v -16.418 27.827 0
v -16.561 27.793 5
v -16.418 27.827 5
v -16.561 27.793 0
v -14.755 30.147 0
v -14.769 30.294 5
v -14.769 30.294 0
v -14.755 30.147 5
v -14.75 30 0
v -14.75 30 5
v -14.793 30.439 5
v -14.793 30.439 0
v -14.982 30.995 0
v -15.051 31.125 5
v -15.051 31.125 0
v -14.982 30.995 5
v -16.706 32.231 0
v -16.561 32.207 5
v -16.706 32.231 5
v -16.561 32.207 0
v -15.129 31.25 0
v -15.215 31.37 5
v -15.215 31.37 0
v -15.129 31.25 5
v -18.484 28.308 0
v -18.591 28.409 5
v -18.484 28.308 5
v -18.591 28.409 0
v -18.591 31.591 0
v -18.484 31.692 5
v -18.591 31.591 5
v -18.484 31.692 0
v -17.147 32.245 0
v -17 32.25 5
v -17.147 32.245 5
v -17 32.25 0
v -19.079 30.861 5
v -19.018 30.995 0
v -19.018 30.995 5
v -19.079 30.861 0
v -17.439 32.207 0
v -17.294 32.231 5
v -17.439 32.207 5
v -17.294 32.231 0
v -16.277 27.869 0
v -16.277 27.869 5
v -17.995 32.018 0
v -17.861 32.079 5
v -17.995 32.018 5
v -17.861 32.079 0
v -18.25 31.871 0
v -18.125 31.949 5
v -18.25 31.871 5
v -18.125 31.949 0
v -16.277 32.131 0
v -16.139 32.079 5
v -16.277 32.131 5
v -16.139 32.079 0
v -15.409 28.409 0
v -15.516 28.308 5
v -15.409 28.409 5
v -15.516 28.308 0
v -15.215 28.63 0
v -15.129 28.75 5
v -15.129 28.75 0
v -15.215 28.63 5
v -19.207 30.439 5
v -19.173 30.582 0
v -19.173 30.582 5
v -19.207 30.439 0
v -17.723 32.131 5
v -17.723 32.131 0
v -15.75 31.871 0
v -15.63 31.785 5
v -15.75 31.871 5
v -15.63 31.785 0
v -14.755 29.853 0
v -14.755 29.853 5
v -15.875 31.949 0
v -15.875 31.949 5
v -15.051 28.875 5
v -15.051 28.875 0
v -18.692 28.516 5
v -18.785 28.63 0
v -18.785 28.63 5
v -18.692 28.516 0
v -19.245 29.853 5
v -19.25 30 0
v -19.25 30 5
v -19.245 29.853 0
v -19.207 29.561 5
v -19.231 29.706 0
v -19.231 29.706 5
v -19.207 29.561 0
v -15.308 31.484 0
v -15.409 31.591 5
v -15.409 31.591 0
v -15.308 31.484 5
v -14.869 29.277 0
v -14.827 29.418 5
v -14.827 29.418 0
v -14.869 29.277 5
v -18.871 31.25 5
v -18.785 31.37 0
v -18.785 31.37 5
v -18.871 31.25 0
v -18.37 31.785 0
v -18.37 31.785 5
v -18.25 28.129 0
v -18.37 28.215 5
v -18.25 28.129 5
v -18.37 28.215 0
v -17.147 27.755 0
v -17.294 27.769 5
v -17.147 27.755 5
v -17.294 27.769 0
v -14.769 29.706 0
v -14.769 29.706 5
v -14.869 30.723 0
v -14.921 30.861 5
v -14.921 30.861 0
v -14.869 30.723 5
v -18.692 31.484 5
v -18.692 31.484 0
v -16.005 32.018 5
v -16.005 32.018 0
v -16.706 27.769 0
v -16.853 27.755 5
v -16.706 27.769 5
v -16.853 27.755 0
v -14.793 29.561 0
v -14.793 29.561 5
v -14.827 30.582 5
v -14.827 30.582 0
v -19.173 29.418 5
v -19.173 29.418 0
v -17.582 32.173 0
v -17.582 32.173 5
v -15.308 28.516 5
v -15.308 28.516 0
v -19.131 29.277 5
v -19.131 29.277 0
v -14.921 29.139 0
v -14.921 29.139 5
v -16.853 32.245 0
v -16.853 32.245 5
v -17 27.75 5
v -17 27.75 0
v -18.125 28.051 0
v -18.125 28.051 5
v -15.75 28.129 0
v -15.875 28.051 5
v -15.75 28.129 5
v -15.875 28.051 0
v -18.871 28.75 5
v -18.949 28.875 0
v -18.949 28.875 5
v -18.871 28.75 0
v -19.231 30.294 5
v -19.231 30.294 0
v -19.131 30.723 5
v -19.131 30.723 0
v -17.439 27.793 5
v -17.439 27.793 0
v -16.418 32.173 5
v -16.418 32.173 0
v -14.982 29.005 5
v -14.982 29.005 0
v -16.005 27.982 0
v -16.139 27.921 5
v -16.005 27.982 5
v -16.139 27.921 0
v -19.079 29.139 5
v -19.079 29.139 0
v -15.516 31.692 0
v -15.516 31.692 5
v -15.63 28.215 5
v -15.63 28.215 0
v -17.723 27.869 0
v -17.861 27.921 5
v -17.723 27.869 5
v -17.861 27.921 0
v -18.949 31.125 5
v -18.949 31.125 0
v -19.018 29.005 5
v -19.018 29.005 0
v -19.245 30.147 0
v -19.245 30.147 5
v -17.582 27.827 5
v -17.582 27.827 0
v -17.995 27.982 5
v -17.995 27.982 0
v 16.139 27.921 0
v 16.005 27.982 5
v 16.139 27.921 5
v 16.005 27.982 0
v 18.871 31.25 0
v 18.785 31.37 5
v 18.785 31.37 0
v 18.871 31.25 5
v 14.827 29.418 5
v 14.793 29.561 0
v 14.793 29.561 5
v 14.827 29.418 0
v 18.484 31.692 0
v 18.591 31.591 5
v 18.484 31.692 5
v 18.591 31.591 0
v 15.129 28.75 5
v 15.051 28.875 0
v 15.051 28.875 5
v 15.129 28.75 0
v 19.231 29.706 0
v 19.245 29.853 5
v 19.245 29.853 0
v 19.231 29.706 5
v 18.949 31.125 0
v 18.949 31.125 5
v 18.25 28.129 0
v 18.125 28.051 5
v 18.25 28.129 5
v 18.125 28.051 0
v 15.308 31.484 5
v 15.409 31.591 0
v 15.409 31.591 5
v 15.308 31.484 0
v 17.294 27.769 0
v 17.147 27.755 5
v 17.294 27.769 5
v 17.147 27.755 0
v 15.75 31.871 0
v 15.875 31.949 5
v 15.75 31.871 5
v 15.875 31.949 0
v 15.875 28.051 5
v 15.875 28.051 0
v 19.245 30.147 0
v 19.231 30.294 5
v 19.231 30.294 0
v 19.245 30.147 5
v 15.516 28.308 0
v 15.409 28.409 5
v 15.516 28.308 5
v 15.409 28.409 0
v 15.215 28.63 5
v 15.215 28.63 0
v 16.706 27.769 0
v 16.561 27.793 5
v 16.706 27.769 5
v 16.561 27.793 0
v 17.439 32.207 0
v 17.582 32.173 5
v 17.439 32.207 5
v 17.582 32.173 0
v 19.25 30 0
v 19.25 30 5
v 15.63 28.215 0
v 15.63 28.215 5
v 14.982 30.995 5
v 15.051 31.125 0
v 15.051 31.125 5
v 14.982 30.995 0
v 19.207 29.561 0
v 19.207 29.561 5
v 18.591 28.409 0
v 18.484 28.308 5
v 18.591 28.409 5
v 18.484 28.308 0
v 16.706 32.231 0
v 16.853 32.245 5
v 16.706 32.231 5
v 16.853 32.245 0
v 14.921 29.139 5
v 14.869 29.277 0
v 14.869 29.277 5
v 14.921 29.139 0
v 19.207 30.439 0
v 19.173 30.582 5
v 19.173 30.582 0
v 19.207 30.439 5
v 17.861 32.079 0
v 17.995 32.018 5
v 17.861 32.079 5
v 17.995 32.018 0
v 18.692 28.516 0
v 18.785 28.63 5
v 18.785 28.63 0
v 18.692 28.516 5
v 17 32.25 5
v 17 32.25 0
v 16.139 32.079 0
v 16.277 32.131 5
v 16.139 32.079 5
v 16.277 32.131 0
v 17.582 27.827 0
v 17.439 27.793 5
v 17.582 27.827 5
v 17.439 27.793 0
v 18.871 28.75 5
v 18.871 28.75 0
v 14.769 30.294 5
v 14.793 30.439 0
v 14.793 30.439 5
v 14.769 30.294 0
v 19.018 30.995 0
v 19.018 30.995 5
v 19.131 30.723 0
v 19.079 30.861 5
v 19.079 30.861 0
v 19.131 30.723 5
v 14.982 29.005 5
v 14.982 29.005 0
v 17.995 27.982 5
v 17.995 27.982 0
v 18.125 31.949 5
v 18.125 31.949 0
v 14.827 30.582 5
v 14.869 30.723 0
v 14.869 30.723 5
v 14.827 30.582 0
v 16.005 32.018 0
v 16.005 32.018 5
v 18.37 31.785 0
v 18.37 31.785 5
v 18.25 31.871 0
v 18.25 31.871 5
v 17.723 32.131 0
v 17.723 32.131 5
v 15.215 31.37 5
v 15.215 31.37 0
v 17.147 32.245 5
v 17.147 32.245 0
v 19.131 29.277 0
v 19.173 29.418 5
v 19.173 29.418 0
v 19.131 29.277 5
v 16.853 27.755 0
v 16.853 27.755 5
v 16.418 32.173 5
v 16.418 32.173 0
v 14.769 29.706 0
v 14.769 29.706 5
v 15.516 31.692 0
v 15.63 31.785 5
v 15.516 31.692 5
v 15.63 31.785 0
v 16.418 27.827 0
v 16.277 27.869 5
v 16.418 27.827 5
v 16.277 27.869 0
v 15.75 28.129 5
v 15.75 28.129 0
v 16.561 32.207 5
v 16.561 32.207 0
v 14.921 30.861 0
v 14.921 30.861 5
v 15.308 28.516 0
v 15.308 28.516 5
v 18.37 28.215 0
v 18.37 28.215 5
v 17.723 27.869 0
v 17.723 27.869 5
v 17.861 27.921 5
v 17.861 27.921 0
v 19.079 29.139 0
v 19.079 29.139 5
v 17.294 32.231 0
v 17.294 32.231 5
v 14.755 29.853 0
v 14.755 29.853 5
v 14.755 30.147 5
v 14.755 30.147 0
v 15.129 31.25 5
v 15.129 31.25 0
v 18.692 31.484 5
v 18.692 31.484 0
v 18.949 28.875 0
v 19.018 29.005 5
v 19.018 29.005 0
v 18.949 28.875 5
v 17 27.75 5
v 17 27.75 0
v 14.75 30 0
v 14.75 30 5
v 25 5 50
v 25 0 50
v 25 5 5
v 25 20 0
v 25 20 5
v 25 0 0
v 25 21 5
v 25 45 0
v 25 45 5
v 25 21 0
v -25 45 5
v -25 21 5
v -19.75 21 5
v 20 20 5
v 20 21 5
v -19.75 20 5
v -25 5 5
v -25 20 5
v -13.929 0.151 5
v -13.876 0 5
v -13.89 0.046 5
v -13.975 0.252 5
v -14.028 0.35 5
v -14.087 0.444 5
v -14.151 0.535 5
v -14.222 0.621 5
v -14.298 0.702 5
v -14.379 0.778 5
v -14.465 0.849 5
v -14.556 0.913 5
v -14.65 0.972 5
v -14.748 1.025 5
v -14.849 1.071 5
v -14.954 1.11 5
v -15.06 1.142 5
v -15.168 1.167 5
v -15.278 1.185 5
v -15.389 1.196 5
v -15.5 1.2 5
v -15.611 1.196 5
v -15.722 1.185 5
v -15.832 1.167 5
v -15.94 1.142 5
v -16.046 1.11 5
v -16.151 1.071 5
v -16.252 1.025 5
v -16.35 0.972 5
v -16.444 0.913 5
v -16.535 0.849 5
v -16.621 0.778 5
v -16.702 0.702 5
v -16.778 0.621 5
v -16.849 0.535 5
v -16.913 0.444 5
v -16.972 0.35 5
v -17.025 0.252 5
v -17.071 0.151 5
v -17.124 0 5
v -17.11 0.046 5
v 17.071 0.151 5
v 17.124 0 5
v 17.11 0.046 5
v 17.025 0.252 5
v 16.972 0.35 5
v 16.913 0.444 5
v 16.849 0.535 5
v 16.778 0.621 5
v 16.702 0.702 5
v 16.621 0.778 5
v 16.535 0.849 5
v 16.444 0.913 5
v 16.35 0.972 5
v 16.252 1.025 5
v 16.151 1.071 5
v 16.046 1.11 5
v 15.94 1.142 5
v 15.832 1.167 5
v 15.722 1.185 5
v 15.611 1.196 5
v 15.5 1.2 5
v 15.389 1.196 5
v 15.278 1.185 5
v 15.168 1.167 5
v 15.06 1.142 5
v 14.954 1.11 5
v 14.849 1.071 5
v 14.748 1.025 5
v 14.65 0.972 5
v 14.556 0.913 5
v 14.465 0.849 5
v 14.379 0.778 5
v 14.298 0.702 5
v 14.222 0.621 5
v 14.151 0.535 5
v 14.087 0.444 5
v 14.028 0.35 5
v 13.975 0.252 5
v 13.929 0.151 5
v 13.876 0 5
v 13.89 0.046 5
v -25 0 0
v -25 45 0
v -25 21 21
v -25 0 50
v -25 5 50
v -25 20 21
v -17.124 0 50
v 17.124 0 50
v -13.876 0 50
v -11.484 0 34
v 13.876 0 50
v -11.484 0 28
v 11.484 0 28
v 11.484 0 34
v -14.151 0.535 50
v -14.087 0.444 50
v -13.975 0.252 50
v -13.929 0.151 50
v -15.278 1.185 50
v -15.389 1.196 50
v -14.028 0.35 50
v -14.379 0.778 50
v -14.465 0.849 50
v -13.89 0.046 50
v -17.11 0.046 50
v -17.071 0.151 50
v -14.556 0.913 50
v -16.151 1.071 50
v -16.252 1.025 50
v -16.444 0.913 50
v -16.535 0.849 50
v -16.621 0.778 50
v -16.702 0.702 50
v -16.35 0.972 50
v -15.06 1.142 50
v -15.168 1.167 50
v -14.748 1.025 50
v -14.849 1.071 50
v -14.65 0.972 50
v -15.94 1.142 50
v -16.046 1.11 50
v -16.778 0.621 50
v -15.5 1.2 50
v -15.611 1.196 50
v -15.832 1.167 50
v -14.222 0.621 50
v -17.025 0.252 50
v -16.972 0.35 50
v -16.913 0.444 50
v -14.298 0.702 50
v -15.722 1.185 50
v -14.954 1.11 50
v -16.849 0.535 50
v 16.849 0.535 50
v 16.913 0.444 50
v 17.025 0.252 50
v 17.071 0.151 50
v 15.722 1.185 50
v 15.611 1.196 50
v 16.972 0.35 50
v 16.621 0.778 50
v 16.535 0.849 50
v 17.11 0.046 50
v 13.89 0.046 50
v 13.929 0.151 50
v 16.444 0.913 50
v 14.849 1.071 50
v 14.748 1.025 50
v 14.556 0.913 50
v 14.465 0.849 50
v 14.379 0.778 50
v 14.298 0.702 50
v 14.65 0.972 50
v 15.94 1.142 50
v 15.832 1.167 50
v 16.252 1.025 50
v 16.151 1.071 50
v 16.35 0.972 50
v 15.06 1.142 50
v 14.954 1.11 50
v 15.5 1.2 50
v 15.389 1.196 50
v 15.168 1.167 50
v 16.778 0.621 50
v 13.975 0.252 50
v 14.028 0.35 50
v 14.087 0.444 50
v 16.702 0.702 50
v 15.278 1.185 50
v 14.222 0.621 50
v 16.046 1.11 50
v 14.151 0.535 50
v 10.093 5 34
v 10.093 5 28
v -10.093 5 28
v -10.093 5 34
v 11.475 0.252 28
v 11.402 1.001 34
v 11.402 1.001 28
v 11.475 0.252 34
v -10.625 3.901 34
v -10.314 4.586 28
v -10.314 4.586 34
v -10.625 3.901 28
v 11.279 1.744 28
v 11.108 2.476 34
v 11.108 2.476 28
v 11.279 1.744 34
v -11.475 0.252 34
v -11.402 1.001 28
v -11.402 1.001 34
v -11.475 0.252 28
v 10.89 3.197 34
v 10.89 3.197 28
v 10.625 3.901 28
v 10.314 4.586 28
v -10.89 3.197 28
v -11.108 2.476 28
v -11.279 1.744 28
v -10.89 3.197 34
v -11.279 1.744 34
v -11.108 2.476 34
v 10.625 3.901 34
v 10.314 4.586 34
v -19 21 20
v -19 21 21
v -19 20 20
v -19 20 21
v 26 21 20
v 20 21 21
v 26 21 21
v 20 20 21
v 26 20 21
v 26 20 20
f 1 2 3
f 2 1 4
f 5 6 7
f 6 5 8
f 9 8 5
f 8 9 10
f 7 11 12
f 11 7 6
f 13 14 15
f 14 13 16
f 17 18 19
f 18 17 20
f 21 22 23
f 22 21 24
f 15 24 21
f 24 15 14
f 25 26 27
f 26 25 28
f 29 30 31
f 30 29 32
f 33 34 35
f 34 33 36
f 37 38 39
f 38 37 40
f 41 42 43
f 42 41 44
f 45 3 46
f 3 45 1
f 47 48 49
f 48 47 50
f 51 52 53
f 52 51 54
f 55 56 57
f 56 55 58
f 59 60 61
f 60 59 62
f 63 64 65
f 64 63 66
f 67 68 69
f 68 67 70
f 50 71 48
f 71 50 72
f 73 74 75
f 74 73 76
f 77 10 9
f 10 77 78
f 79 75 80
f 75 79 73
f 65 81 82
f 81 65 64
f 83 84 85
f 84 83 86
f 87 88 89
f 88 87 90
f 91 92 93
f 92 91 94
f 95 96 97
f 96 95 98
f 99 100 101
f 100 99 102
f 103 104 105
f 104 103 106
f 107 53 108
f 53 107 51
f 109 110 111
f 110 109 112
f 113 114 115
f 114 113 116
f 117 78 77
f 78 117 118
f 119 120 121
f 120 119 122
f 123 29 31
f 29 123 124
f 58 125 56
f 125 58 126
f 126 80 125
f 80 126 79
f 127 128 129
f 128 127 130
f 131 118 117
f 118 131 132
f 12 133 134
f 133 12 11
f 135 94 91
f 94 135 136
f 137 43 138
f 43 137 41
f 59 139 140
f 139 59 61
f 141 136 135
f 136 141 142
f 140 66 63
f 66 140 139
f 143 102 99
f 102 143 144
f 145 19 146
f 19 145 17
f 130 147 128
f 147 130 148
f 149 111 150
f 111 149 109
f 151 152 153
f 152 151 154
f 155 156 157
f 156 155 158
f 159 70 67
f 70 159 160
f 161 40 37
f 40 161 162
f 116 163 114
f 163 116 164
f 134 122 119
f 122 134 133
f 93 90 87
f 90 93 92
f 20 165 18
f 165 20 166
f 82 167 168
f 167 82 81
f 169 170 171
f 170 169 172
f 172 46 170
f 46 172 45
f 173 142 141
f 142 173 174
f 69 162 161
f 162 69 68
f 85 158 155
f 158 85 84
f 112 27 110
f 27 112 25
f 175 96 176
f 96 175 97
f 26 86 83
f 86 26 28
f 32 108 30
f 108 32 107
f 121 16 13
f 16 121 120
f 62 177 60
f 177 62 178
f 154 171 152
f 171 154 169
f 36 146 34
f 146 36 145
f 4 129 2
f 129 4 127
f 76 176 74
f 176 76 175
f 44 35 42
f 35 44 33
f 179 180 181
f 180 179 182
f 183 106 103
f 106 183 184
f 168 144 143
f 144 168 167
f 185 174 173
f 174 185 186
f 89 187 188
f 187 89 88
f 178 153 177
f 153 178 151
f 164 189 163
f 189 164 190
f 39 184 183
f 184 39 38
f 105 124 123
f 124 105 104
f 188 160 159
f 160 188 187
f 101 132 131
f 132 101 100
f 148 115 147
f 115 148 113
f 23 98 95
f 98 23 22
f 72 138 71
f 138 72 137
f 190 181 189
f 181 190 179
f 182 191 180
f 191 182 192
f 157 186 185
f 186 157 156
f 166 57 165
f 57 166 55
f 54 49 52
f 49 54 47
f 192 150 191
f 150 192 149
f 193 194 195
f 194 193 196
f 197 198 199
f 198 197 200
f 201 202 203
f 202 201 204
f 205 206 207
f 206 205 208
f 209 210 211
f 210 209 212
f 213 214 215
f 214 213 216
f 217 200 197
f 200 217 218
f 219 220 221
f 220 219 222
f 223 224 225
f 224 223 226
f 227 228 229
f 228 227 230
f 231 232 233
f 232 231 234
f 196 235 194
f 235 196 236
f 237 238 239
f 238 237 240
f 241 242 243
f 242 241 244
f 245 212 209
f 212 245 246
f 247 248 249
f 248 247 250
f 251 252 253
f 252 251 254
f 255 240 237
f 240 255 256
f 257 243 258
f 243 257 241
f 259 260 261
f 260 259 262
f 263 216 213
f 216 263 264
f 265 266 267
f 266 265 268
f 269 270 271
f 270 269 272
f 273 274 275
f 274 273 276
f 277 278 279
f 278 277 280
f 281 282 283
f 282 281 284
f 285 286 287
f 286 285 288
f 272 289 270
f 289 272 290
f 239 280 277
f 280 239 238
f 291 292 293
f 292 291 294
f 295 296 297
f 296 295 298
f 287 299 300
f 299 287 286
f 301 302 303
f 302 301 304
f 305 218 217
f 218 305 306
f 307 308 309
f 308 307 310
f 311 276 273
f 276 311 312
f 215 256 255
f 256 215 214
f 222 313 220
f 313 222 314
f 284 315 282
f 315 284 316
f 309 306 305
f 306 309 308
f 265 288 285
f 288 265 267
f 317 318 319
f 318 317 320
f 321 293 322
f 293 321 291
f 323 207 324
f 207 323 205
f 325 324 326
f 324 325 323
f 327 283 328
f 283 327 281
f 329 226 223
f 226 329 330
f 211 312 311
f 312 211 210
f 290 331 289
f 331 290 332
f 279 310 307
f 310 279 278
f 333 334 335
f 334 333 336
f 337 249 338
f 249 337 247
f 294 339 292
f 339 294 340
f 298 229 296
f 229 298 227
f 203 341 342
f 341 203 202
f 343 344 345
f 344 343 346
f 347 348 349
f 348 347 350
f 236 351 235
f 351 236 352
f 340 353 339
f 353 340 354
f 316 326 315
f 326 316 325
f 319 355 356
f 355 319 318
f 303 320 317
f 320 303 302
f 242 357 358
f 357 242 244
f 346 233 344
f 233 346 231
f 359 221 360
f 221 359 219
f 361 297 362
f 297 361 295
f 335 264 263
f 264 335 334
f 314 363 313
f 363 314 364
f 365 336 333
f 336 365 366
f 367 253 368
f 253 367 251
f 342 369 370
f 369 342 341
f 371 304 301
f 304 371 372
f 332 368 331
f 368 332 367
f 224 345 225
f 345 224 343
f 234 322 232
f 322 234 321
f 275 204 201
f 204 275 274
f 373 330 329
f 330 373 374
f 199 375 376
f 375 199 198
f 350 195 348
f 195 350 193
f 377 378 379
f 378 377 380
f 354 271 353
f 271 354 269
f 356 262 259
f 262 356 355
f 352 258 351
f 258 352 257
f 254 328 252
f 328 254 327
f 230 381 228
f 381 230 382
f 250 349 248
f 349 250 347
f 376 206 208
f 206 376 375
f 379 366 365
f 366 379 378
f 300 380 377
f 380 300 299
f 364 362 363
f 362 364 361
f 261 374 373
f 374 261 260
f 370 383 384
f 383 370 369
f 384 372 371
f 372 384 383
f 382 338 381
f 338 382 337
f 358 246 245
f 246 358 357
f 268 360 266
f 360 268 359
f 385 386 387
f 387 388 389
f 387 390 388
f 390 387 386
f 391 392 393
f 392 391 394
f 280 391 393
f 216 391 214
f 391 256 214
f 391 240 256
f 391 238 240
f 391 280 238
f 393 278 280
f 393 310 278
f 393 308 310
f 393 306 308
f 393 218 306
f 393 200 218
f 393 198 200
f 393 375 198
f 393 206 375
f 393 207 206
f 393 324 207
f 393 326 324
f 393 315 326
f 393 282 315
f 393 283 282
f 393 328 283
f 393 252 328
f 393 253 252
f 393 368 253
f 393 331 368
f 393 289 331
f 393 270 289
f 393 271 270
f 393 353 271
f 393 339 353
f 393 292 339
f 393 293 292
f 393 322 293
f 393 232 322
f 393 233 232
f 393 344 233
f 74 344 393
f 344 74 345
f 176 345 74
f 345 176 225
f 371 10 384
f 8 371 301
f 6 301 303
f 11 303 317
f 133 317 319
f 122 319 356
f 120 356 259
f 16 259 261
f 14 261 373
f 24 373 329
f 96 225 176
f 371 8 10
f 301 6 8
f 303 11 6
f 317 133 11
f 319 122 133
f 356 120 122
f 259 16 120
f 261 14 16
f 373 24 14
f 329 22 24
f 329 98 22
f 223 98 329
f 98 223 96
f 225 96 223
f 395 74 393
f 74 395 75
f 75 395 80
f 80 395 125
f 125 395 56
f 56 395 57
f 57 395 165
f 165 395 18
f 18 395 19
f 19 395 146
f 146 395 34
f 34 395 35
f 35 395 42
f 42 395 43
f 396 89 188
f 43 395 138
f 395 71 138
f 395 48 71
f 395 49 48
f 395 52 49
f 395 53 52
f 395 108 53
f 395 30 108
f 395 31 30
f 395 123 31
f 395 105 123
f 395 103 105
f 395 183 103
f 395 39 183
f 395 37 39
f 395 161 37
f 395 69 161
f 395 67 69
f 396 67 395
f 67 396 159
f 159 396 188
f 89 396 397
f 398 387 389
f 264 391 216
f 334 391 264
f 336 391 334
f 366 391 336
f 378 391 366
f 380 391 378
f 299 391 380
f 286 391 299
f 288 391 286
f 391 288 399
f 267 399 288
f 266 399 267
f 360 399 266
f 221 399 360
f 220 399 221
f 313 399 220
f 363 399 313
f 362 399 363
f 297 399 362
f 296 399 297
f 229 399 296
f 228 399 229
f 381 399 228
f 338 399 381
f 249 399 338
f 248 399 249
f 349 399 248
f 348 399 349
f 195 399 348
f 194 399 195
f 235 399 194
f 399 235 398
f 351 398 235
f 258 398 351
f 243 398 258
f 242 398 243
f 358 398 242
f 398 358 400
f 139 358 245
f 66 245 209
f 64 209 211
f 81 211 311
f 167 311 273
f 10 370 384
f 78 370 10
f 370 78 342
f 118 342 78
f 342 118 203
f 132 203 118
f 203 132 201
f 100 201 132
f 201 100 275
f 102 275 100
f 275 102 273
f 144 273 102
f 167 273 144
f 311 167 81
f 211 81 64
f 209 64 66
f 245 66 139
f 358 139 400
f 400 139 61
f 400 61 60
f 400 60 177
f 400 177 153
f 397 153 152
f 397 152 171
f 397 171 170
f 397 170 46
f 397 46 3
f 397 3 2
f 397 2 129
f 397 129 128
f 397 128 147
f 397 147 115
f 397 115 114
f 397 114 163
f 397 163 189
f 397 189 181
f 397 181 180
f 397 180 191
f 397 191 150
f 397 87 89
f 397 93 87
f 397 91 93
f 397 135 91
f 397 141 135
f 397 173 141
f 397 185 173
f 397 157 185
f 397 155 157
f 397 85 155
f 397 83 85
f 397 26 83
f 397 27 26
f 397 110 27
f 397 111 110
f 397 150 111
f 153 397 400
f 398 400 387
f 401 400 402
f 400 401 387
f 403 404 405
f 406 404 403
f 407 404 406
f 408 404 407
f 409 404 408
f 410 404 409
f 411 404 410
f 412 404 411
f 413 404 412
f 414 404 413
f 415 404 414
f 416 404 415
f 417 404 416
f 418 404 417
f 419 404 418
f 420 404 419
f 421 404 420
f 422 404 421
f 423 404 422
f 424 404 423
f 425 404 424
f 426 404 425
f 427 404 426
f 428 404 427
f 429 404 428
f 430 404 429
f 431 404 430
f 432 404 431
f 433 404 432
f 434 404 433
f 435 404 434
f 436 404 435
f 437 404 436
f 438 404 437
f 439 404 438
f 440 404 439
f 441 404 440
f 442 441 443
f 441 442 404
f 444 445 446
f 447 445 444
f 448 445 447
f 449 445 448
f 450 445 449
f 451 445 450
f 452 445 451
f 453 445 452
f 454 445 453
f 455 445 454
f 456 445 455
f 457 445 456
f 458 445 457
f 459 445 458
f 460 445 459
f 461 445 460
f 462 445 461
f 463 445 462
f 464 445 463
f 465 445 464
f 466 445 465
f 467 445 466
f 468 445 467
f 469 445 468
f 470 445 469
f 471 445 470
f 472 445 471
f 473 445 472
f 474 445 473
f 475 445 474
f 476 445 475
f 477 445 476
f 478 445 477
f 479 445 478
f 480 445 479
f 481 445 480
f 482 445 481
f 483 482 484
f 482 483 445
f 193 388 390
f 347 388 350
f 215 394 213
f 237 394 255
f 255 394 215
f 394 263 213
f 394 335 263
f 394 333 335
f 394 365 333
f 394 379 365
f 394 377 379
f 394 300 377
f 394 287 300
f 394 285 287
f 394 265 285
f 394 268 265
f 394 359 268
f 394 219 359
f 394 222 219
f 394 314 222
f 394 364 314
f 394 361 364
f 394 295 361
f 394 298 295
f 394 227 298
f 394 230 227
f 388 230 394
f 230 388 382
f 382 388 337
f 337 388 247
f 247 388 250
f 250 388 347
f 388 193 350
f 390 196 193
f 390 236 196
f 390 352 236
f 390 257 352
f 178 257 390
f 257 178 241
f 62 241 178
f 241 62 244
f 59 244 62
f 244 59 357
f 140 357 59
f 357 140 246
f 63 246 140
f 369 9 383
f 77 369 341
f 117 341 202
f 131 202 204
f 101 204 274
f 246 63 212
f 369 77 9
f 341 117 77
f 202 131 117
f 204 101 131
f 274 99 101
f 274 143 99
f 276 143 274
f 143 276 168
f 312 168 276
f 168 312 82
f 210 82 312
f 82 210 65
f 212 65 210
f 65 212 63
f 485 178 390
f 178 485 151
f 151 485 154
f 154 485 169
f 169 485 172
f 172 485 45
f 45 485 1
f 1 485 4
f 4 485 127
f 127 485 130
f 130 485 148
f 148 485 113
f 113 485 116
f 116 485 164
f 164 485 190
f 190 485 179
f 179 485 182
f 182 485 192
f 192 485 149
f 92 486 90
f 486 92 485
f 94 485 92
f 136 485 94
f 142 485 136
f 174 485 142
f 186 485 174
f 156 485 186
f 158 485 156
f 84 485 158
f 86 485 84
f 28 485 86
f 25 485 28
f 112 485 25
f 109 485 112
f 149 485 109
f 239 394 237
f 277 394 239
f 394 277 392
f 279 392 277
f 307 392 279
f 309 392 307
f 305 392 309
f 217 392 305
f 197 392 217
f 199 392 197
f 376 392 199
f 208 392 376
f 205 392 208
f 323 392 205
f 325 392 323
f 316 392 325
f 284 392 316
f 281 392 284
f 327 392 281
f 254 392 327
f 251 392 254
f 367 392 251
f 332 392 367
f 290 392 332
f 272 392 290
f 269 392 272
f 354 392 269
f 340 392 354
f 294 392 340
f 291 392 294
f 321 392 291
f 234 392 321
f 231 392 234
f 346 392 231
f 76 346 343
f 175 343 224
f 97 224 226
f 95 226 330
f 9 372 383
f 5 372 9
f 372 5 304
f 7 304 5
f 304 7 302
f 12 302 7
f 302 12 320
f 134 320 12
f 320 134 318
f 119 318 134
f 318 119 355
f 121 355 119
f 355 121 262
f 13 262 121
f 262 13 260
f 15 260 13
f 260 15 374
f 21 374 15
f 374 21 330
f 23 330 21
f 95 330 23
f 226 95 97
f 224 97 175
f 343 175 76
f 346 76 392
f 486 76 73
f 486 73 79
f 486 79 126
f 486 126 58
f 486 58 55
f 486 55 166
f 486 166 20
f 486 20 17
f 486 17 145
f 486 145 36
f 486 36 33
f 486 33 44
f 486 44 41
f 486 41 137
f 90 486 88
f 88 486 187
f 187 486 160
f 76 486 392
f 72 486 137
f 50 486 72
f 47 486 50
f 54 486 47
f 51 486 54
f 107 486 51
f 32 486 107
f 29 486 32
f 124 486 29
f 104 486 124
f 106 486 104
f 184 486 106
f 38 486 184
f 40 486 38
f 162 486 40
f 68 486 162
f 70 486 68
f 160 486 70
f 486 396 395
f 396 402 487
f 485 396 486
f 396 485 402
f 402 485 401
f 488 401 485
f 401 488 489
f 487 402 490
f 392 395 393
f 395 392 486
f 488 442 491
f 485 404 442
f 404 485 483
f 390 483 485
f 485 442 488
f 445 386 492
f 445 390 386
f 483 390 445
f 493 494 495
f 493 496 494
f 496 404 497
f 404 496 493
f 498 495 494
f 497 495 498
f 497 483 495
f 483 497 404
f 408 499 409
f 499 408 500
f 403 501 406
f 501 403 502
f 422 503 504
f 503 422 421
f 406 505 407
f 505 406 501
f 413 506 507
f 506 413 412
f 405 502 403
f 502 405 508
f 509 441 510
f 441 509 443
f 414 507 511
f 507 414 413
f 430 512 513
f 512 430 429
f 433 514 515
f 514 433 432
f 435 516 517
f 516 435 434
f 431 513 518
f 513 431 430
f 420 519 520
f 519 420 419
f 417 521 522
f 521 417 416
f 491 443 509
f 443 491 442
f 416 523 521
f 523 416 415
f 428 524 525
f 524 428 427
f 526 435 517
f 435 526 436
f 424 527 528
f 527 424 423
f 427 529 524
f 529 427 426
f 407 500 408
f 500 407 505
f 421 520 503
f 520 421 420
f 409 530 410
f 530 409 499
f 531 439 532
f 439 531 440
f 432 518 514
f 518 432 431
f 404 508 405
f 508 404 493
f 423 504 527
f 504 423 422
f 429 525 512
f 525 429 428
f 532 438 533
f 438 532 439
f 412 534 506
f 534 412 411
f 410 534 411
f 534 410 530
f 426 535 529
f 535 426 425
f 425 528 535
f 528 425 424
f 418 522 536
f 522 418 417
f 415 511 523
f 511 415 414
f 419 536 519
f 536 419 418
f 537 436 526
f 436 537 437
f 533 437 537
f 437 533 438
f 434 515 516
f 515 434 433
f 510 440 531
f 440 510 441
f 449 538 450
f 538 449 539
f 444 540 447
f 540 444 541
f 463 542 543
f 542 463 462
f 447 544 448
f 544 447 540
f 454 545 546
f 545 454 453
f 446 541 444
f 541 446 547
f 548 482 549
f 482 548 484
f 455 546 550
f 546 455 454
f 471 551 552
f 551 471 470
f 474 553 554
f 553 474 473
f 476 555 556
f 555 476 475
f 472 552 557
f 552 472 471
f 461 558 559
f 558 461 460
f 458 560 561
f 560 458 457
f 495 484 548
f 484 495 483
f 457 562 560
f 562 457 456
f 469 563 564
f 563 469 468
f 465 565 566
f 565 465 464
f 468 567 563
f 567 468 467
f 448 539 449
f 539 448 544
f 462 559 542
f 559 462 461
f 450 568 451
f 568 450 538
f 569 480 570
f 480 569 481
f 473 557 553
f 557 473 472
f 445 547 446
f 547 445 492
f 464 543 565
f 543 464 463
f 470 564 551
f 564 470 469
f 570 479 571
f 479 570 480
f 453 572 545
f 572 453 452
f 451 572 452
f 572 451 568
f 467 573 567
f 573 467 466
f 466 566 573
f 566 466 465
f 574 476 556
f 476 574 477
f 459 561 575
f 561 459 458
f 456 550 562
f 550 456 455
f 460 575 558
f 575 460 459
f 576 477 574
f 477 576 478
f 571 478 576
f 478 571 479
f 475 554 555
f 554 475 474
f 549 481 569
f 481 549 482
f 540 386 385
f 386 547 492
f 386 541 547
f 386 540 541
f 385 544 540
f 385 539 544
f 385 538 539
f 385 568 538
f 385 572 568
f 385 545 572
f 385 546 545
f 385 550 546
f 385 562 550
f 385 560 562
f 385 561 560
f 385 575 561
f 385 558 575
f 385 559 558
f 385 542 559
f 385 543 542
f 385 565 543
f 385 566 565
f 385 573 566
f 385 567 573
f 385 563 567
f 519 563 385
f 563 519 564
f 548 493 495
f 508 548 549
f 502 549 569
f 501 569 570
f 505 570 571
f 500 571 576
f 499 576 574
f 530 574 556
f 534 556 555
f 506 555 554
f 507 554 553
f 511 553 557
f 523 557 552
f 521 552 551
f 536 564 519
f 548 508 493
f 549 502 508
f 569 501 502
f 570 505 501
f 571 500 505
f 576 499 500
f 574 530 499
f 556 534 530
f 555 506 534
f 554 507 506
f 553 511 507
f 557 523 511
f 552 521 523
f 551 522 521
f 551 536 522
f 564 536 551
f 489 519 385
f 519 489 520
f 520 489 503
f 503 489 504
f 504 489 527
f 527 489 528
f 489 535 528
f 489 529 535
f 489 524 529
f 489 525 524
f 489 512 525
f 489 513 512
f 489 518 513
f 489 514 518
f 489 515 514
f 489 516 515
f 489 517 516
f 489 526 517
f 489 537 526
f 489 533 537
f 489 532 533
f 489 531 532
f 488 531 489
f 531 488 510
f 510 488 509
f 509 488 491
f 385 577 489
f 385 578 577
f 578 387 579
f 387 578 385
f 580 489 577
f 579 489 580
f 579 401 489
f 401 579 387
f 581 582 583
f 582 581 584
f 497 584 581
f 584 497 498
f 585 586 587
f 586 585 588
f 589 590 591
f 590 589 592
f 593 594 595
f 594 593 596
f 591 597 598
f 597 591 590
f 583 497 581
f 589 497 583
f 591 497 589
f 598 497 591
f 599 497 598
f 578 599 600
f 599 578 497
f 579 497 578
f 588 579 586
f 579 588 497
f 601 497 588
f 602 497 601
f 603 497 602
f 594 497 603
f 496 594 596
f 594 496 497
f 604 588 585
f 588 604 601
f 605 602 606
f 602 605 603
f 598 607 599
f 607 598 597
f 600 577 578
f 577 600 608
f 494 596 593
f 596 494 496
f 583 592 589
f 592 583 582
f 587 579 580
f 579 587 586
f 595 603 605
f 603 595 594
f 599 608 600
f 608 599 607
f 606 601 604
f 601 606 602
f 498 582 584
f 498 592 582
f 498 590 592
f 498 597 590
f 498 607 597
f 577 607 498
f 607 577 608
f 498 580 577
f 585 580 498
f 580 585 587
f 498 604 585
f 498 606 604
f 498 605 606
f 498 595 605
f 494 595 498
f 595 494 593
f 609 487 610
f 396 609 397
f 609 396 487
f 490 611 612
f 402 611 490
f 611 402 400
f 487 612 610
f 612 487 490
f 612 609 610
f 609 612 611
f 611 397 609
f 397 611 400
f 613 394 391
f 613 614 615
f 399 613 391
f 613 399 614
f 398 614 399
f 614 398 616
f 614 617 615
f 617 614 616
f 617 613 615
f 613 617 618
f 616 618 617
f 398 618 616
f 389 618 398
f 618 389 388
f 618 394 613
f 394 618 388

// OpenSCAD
// L-shaped mounting bracket for NEMA 17 stepper motor (syringe pump)
// Print orientation: base plate on bed, motor plate building up (+Z)

$fn = 96;

// ---- Base plate ----
base_x0 = -25; base_x1 = 25;   // X span of base plate
base_y0 = 0;   base_y1 = 45;  // Y span of base plate
base_z0 = 0;   base_z1 = 5;   // base plate thickness

// ---- Motor plate ----
motor_x0 = -25; motor_x1 = 25; // X span of motor plate
motor_y0 = 0;   motor_y1 = 5;  // Y depth of motor plate
motor_z0 = 0;   motor_z1 = 50; // motor plate height

// ---- Through-holes ----
hole_d     = 4.5;              // M4 hole diameter
hole_x     = [-17, 17];        // hole centre X positions
hole_y     = 30;               // hole centre Y position

// ---- Boss hole (motor centring) ----
boss_d     = 23;               // boss hole diameter
boss_x     = 0;                // boss hole centre X
boss_z     = 28;               // boss hole centre height

// ---- Screw holes for boss ----
screw_d    = 3.4;              // M3 screw hole diameter
screw_n    = 4;                // number of screw holes
screw_r    = 31 / 2;           // square pattern half-size (15.5 mm)

// ---- Gussets ----
gusset_t   = 5;                // gusset thickness
gusset_a   = 20;               // leg length along +Y
gusset_b   = 20;               // leg length along +Z
gusset_x   = [-25, 20];        // gusset X start (left, right)

// ---- Misc ----
eps        = 0.5;              // cutter overshoot past faces

union() {
    // Base plate with M4 holes
    difference() {
        translate([base_x0, base_y0, base_z0])
            cube([base_x1 - base_x0, base_y1 - base_y0, base_z1 - base_z0]);
        for (x = hole_x)
            translate([x, hole_y, base_z0 - eps])
                cylinder(d = hole_d, h = base_z1 - base_z0 + 2 * eps);
    }

    // Motor plate with boss hole and screw holes
    difference() {
        translate([motor_x0, motor_y0, motor_z0])
            cube([motor_x1 - motor_x0, motor_y1 - motor_y0, motor_z1 - motor_z0]);
        // Boss hole along Y
        translate([boss_x, motor_y0 - eps, boss_z])
            cylinder(d = boss_d, h = motor_y1 - motor_y0 + 2 * eps);
        // Screw holes on square pattern
        for (i = [0 : screw_n - 1]) {
            a = screw_r * (i < 2 ? 1 : -1);
            b = screw_r * (i % 2 ? 1 : -1);
            translate([boss_x + b, motor_y0 - eps, motor_z0 - eps])
                cylinder(d = screw_d, h = motor_z1 - motor_z0 + 2 * eps);
        }
    }

    // Triangular gussets flush with plate edges
    for (gx = gusset_x)
        translate([gx, 0, 0])
            hull() {
                translate([0, gusset_a, 0]) cube([gusset_t, 1, 1]);     // bottom right
                translate([0, gusset_a, gusset_b]) cube([gusset_t, 1, 1]); // top right
                translate([gusset_t, gusset_a, gusset_b]) cube([1, 1, 1]);   // top left
            }
}
